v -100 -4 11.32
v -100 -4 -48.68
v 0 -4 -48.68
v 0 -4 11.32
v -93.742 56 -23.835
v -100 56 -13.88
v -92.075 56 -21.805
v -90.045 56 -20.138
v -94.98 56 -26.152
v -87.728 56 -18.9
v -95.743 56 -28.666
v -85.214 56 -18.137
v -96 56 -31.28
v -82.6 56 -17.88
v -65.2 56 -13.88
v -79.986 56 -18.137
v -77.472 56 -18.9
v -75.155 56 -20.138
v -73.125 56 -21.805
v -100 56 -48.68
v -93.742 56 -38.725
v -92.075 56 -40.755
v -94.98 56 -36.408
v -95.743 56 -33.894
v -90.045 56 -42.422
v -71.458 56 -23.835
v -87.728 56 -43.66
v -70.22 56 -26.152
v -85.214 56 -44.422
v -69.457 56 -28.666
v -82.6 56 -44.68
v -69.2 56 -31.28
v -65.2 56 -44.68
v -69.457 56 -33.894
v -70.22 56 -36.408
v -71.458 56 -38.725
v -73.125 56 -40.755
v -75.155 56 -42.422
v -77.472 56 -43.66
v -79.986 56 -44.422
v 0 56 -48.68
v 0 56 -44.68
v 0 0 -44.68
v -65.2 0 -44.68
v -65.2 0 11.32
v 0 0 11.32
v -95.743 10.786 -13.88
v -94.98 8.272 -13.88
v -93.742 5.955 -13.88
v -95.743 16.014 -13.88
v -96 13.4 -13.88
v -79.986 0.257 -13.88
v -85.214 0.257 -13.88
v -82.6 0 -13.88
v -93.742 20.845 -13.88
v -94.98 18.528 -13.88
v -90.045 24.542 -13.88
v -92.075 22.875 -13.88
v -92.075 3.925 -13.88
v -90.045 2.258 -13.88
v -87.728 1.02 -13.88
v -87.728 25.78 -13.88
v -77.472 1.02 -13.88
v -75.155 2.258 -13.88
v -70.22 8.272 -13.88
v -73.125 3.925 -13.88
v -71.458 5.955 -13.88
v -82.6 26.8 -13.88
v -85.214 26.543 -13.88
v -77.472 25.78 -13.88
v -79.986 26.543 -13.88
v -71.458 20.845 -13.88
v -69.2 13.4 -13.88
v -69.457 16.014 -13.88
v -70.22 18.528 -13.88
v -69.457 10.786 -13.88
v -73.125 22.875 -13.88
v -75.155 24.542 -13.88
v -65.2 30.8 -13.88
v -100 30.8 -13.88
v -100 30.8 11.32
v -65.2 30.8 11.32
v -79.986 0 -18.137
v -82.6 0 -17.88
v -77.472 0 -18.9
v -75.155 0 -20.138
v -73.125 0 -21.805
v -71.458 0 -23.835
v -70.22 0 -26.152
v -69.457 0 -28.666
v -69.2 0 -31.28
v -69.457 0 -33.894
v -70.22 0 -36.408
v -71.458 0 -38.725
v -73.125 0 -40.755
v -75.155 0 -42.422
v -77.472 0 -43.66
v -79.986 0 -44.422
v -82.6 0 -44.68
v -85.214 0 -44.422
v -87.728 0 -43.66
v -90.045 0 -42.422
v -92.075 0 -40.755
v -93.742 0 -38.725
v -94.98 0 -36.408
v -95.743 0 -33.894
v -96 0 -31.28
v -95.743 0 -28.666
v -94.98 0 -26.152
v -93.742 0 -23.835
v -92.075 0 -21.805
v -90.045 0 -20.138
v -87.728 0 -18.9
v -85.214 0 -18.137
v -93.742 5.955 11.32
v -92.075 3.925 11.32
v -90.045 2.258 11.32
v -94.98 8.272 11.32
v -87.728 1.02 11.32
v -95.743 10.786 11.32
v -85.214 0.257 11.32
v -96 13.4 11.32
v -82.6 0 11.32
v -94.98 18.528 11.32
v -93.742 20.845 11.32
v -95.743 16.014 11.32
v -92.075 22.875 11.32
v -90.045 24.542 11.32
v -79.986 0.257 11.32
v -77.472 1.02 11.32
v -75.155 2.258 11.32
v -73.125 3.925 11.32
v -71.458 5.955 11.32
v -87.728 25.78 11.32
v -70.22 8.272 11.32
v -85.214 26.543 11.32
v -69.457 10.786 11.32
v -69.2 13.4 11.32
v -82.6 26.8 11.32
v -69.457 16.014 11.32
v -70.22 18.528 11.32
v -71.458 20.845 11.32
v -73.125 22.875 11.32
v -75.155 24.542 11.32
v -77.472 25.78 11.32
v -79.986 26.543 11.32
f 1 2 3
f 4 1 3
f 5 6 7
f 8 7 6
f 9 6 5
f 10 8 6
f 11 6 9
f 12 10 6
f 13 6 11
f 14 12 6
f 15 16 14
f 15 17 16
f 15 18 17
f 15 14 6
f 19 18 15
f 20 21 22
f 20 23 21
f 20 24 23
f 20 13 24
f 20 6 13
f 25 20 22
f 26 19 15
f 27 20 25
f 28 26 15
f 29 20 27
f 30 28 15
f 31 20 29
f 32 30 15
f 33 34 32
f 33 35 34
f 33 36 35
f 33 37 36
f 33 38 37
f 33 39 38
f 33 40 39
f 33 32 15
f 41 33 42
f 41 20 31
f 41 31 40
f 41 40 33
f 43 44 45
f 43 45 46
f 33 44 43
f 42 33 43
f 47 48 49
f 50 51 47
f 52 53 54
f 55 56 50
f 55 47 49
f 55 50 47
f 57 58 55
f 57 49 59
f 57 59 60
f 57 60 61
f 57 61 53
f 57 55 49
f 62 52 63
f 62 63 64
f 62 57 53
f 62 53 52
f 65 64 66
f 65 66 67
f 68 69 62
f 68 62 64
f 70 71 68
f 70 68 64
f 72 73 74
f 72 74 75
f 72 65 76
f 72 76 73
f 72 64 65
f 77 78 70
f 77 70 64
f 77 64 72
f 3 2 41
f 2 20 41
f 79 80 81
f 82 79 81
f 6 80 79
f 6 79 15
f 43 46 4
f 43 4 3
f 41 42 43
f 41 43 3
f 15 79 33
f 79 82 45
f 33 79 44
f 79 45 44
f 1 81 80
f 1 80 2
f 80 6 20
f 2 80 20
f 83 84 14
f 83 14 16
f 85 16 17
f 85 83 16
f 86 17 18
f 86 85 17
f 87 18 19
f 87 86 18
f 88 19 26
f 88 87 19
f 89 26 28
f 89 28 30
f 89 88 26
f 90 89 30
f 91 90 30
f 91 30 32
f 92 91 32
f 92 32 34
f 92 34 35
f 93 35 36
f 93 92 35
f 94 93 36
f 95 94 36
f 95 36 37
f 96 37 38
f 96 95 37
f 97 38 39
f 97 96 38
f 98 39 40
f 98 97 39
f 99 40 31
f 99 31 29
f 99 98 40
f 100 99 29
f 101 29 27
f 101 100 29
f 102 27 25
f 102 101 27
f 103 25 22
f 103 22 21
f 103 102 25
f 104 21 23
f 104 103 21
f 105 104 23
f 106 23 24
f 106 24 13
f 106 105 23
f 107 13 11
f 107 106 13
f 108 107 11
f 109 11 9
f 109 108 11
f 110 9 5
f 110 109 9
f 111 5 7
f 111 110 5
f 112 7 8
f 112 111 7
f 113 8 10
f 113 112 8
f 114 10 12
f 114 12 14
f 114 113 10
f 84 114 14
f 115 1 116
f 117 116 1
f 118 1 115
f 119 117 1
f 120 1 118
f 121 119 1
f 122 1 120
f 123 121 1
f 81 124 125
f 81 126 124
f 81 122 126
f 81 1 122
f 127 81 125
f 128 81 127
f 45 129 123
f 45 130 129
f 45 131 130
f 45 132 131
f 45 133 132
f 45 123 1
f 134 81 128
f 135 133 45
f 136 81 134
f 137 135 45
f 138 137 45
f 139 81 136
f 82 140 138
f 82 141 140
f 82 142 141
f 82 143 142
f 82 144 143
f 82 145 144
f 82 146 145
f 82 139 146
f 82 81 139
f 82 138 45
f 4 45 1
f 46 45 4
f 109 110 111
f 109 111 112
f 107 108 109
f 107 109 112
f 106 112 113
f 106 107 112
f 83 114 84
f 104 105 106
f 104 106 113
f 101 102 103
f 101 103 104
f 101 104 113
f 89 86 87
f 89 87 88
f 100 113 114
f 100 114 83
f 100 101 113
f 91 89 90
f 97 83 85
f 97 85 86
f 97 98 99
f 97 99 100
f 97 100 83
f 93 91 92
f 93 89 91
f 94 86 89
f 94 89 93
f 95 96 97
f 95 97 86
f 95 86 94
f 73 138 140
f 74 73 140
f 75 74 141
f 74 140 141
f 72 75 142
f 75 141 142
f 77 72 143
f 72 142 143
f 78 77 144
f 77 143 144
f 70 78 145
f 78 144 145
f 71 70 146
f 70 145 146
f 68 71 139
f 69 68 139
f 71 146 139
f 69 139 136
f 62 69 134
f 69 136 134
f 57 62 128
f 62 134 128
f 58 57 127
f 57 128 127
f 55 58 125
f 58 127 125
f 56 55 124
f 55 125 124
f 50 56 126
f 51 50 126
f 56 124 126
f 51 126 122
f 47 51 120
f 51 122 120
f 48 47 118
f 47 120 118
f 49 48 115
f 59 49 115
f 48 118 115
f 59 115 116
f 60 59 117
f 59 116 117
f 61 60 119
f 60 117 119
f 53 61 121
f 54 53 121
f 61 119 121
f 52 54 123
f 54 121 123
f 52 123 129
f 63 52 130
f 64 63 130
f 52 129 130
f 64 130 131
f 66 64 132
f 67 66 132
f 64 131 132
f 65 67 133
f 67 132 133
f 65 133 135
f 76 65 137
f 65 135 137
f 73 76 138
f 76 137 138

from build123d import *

# Parameters (mm, degrees)
SKETCH1_R           = 13.4
BOSS_EXTRUDE1_DEPTH = 56
SKETCH2_W           = 100
SKETCH2_H           = 60
BOSS_EXTRUDE2_DEPTH = 4
SKETCH3_R           = 13.4
CUT_EXTRUDE1_DEPTH  = 25.2
SKETCH4_W           = 25.2
SKETCH4_H           = 25.2
CUT_EXTRUDE2_DEPTH  = 51.2


with BuildPart() as part:
    # Sketch1 → Boss-Extrude1 (new body)
    with BuildSketch(Plane(origin=(0, 0, 0), x_dir=(1, 0, 0), z_dir=(0, 1, 0))):
        Polygon((-65.2, -11.320132013), (-65.2, 44.679867987), (0, 44.679867987), (0, 48.679867987), (-100, 48.679867987), (-100, -11.320132013), align=None)
        with Locations(Location((-82.6, 31.279867987, 0), (0, 0, 270))):
            Circle(SKETCH1_R, mode=Mode.SUBTRACT)
    extrude(amount=BOSS_EXTRUDE1_DEPTH)

    # Sketch2 → Boss-Extrude2 (add)
    with BuildSketch(Plane(origin=(0, 0, 0), x_dir=(1, 0, 0), z_dir=(0, 1, 0))):
        with Locations((-50, 18.679867987)):
            Rectangle(SKETCH2_W, SKETCH2_H)
    extrude(amount=-BOSS_EXTRUDE2_DEPTH)

    # Sketch3 → Cut-Extrude1 (cut)
    with BuildSketch(Plane.XY.offset(11.320132013)):
        with Locations((-82.6, 13.4)):
            Circle(SKETCH3_R)
    extrude(amount=-CUT_EXTRUDE1_DEPTH, mode=Mode.SUBTRACT)

    # Sketch4 → Cut-Extrude2 (cut)
    with BuildSketch(Plane.ZY.offset(100)):
        with Locations((-1.279867987, 43.4)):
            Rectangle(SKETCH4_W, SKETCH4_H)
    extrude(amount=-CUT_EXTRUDE2_DEPTH, mode=Mode.SUBTRACT)


solid = part.part
